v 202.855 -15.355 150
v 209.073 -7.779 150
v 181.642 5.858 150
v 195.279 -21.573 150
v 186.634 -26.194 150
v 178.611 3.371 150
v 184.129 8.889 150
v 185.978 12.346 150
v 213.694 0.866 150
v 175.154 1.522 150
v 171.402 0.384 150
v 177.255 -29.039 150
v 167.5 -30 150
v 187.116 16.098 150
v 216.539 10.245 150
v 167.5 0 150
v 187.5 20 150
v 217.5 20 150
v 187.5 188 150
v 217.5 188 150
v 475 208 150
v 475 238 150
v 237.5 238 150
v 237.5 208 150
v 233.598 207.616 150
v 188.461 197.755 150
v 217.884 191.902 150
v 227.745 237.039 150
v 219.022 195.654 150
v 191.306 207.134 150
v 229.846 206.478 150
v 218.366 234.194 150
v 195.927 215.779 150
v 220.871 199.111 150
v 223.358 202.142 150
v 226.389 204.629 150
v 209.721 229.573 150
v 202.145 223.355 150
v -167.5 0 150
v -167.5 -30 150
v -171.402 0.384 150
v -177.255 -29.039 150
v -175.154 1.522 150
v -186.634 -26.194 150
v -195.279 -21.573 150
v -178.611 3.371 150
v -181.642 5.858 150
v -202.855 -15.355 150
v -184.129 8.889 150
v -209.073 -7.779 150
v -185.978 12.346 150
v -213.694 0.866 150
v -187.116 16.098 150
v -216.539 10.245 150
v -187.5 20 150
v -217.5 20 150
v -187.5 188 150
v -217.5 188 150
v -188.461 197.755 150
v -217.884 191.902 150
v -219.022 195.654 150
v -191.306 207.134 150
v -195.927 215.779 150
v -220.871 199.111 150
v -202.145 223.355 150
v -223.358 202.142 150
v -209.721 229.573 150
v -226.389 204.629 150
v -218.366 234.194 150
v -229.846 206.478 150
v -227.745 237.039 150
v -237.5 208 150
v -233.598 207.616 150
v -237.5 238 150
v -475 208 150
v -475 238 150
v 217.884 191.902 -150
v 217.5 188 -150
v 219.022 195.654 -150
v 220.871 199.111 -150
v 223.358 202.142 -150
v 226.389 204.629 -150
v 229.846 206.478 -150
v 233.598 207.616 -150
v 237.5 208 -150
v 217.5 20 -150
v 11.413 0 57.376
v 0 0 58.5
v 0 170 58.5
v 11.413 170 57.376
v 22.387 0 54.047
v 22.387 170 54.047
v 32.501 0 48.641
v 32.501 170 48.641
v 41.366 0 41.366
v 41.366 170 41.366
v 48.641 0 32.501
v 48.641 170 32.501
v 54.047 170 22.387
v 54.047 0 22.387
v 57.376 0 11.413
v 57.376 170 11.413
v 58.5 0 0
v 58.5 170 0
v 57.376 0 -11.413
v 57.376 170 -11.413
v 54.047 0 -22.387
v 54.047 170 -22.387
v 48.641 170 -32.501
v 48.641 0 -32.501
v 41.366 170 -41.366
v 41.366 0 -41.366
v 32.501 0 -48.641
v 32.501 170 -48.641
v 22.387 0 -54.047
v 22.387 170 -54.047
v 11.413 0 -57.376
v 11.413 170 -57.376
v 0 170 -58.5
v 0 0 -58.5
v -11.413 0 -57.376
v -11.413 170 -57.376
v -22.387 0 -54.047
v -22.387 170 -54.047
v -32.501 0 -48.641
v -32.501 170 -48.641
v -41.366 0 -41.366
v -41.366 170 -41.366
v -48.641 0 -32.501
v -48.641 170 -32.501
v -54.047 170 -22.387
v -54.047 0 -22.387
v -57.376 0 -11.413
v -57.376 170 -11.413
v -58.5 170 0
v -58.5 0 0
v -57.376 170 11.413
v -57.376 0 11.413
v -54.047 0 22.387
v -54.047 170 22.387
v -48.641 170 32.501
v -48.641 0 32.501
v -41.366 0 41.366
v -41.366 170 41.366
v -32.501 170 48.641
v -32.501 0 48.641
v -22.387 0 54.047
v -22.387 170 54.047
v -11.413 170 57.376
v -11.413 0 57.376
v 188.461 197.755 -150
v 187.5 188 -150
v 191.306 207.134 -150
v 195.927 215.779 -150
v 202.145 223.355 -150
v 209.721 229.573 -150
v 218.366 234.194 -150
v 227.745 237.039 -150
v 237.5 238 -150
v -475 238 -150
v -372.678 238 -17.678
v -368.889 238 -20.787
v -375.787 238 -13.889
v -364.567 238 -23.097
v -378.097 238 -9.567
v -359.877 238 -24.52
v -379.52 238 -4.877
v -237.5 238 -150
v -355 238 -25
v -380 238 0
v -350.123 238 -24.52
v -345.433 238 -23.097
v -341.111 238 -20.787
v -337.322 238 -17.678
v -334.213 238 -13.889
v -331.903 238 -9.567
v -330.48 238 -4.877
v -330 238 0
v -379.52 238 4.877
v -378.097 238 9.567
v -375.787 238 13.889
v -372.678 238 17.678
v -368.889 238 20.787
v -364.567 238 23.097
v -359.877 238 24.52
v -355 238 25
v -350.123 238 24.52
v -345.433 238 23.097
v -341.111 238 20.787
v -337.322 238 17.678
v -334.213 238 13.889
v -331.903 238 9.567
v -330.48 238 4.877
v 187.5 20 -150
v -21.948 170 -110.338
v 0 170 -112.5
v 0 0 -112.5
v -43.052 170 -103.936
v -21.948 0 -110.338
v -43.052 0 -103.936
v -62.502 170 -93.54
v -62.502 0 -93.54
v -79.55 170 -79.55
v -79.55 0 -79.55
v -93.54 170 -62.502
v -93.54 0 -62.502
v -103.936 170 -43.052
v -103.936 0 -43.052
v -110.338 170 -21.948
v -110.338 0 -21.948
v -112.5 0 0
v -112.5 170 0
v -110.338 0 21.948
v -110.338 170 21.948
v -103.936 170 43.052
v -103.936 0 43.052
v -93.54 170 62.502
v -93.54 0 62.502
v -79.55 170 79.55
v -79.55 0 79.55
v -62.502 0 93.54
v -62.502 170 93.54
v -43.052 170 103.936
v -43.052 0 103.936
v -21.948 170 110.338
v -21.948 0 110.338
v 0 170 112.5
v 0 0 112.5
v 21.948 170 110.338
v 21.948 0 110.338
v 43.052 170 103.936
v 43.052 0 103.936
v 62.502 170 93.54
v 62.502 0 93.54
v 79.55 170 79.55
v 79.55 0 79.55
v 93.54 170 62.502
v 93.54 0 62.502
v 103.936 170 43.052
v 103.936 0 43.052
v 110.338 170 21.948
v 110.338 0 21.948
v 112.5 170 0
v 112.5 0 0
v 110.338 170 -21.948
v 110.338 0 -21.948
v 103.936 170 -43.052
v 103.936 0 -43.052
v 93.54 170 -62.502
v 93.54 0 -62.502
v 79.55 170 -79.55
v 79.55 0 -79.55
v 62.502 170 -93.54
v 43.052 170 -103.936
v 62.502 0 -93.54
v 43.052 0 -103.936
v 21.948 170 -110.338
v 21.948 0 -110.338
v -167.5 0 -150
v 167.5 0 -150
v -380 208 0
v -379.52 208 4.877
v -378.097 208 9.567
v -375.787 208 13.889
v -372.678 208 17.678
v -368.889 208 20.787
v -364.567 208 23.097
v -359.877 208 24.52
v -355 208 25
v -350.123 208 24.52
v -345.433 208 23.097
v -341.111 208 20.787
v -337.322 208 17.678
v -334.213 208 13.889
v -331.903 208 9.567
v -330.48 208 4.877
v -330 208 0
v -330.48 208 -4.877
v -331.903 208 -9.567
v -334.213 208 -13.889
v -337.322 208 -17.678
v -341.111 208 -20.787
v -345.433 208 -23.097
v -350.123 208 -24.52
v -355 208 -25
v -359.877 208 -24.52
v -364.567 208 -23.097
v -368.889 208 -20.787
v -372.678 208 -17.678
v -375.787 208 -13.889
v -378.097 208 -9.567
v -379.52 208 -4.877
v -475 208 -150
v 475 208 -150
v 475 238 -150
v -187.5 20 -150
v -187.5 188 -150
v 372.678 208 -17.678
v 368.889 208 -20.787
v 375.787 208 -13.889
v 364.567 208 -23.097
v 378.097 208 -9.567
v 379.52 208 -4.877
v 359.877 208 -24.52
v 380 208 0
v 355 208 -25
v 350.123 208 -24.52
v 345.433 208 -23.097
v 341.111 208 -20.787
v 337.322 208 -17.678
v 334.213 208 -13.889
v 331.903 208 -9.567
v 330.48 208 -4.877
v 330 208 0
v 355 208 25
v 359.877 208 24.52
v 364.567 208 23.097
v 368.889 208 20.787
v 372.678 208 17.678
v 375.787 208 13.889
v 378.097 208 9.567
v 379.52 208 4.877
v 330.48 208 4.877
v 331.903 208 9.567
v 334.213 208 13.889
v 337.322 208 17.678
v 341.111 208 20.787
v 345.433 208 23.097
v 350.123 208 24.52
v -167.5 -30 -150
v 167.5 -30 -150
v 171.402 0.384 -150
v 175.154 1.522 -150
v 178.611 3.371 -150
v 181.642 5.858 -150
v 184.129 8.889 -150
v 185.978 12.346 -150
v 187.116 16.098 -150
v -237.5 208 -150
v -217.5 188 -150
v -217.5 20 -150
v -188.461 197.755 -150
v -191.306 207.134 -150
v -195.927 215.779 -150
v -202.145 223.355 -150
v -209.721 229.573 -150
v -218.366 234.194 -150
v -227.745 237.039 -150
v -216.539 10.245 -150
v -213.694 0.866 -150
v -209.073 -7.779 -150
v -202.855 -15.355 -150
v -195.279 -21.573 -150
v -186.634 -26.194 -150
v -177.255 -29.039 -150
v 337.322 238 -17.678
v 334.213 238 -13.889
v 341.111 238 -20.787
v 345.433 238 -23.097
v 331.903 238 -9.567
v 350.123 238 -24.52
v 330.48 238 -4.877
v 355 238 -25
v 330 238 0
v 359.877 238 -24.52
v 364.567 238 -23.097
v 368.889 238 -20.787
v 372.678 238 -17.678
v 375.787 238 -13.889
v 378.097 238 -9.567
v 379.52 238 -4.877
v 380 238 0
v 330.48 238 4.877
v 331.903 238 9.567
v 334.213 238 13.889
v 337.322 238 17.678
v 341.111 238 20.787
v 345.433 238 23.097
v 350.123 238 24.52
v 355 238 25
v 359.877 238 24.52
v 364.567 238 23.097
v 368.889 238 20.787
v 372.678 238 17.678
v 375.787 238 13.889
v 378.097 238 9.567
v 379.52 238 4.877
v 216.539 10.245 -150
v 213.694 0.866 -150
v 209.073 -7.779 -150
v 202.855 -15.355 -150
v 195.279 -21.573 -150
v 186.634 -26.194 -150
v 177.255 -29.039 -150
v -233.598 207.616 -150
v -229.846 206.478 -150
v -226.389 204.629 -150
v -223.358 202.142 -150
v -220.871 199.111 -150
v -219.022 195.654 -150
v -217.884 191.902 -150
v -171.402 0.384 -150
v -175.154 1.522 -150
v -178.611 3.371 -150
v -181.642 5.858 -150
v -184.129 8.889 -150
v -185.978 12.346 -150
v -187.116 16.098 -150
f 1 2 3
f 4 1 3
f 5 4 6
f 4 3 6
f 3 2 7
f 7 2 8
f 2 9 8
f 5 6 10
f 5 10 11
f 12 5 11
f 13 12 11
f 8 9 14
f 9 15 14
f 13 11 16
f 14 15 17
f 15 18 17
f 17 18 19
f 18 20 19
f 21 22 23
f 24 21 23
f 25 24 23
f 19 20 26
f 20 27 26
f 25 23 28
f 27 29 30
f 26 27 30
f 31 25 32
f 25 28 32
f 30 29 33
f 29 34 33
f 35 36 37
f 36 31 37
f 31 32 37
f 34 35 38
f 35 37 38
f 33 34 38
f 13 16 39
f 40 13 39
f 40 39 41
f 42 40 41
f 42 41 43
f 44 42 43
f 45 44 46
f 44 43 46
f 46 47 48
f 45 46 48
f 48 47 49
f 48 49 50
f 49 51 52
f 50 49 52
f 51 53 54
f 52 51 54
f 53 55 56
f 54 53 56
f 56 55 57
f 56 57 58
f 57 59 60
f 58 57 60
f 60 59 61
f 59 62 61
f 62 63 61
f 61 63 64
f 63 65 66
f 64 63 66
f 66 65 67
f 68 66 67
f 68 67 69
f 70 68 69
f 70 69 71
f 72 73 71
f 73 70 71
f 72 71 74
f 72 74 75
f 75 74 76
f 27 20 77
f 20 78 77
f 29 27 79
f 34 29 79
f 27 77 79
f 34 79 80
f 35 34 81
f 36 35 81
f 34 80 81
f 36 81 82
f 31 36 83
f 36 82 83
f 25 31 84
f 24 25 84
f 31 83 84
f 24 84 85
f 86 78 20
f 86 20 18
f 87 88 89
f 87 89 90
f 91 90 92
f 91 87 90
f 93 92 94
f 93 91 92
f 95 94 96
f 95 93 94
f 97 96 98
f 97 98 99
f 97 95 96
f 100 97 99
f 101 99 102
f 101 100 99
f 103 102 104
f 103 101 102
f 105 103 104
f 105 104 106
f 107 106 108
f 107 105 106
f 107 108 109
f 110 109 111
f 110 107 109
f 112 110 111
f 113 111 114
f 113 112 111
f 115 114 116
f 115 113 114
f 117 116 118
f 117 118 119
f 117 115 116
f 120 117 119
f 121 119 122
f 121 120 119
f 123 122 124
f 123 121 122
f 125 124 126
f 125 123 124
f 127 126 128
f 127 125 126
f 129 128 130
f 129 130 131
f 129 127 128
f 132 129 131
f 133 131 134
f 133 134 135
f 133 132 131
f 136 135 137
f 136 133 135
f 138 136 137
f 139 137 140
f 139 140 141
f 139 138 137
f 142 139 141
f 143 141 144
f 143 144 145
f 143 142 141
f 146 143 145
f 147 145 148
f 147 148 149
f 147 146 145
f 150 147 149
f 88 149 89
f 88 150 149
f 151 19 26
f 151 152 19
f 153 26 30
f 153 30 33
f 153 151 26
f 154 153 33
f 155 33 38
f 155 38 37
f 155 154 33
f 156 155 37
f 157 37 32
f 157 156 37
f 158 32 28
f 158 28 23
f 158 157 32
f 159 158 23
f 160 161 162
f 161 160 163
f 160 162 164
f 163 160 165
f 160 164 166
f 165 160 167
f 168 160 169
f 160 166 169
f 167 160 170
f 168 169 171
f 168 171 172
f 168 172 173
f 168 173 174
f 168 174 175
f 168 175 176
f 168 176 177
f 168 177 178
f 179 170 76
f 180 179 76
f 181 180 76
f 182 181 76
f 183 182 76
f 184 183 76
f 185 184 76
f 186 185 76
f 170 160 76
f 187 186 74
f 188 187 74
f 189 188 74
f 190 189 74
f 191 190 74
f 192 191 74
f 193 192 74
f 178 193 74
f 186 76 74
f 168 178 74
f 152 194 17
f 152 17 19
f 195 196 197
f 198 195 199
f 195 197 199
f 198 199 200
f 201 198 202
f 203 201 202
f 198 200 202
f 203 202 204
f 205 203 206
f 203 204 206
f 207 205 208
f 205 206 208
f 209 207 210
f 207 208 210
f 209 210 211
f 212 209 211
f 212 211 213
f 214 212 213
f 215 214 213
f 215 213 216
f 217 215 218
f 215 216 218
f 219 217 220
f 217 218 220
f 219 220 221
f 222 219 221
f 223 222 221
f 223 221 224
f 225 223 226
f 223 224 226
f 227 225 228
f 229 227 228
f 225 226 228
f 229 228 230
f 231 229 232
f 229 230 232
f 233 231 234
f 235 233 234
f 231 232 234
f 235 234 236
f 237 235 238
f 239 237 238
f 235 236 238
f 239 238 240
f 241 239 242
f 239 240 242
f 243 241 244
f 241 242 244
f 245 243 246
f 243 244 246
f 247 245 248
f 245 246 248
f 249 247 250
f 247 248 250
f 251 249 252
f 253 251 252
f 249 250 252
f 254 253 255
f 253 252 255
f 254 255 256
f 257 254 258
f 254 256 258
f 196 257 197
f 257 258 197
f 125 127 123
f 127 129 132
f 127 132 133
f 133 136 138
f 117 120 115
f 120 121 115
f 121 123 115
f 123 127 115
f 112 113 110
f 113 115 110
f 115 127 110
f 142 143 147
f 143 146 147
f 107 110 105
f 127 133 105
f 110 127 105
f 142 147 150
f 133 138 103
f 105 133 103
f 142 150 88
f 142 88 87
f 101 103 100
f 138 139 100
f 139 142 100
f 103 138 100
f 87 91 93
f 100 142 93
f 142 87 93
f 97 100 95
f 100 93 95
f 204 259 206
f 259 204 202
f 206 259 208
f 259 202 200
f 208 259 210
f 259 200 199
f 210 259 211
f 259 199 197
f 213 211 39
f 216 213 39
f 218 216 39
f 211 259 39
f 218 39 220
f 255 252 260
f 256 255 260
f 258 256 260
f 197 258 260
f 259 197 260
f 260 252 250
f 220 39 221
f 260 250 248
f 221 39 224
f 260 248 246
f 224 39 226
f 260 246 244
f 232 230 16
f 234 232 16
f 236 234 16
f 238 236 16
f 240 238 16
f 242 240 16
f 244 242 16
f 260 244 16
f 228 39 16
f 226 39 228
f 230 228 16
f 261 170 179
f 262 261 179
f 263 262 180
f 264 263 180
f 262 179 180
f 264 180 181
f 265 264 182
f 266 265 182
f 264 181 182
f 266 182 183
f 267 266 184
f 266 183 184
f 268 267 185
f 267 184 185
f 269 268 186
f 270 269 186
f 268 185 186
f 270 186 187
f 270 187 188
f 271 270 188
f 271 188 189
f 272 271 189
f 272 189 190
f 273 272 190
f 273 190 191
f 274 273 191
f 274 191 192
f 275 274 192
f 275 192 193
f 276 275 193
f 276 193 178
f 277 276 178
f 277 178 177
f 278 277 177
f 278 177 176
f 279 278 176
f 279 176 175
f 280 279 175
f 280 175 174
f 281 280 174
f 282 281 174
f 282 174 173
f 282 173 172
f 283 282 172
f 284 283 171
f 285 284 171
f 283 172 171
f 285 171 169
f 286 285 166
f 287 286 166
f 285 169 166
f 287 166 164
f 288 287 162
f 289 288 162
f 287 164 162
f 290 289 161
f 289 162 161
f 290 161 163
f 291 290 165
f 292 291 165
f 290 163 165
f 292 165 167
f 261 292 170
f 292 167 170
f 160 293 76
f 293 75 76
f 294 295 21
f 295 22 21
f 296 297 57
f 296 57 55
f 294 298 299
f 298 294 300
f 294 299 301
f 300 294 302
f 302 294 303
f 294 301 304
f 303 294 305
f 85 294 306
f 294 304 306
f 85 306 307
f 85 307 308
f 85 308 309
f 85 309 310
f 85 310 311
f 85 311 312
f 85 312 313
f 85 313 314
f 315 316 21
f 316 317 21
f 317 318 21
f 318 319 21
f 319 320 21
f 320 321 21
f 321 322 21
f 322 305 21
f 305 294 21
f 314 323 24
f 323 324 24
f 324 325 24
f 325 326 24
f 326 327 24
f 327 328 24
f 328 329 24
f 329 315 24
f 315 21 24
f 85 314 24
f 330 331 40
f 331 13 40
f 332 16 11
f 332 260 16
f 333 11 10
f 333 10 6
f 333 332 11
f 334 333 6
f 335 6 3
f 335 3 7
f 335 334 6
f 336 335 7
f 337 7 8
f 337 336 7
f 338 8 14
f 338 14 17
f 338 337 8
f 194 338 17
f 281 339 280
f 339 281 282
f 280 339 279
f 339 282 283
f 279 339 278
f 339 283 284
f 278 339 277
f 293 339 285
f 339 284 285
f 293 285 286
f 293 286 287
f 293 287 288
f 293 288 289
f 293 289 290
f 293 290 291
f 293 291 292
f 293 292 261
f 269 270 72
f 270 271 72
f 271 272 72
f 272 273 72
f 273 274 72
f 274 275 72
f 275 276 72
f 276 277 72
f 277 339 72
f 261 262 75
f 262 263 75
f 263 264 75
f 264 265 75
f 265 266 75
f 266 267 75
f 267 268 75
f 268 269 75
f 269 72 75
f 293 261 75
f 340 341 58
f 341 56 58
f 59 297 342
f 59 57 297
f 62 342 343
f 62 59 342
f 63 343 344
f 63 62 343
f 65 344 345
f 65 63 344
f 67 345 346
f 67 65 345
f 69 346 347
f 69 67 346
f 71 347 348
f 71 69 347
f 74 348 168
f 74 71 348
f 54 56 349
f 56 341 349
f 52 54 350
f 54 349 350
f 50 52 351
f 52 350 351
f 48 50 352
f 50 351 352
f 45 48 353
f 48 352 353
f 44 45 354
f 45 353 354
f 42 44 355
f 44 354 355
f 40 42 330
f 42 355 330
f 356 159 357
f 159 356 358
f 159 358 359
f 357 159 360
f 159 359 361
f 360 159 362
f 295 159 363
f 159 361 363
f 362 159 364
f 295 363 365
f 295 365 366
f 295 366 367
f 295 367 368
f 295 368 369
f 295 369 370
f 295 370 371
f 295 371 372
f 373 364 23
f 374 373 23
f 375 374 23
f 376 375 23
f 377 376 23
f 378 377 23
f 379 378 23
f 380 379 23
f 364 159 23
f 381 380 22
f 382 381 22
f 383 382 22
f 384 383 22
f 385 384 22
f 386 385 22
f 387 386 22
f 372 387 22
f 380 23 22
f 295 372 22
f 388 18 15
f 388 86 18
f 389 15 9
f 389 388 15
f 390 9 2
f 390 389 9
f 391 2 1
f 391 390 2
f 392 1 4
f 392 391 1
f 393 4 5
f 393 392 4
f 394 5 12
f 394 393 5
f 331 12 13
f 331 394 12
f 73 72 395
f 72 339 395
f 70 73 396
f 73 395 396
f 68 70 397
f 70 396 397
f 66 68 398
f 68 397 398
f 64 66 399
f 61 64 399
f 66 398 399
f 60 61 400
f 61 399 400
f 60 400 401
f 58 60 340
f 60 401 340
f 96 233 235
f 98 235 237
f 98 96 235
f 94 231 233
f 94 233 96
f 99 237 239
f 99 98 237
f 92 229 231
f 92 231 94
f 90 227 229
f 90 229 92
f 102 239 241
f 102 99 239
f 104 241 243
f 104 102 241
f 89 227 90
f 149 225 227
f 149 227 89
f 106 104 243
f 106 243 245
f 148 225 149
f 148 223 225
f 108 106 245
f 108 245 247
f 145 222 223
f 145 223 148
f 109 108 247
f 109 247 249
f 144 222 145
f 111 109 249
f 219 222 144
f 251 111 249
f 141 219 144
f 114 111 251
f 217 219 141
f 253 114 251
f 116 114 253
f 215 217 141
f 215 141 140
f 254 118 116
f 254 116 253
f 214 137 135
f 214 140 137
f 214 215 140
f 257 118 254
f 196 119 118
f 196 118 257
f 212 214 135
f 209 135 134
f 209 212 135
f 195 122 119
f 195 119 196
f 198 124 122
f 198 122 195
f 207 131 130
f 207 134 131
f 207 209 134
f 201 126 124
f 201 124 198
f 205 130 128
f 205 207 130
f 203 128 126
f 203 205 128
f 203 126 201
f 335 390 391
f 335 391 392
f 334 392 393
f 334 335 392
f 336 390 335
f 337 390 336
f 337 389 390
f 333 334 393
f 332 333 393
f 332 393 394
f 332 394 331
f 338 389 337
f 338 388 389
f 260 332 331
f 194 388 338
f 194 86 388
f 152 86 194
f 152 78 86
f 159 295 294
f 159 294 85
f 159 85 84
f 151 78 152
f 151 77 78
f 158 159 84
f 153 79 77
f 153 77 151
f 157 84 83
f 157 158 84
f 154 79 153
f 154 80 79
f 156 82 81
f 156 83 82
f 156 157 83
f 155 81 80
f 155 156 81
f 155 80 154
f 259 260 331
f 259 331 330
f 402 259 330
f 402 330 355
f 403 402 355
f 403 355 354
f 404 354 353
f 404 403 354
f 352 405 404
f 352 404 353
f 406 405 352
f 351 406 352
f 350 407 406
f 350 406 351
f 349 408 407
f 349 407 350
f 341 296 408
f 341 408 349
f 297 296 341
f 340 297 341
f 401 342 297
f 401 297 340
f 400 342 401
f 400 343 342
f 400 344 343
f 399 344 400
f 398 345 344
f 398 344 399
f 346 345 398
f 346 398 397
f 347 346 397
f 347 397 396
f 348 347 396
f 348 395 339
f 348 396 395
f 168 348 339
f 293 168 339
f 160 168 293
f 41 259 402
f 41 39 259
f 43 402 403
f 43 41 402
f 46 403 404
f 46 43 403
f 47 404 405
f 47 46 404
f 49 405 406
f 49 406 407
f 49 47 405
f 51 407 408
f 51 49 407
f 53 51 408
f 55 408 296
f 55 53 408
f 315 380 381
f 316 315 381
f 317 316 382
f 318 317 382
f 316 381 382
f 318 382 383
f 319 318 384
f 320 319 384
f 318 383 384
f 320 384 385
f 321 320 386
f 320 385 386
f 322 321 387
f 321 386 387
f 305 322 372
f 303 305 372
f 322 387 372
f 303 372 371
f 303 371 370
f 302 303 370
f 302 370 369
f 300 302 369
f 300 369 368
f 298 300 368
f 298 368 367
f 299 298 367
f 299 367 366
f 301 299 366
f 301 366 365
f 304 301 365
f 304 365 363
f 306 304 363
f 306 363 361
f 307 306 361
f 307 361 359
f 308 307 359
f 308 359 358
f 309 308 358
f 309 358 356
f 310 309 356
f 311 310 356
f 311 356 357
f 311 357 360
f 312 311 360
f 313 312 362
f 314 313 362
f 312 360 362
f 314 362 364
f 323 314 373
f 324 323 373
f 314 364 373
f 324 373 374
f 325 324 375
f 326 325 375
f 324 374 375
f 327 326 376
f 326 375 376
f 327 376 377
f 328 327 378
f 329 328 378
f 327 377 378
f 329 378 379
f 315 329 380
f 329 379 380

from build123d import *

# Parameters (mm, degrees)
BOSS_EXTRUDE1_DEPTH = 150
FILLET1_R           = 20
FILLET2_R           = 50
SKETCH2_R           = 25
CUT_EXTRUDE1_DEPTH  = 566.640345096
SKETCH3_R           = 112.5
SKETCH3_R_2         = 58.5
BOSS_EXTRUDE2_DEPTH = 170


with BuildPart() as part:
    # Sketch1 → Boss-Extrude1 (new, symmetric)
    with BuildSketch(Plane.XY):
        Polygon((-187.5, 0), (187.5, 0), (187.5, 238), (475, 238), (475, 208), (217.5, 208), (217.5, -30), (-217.5, -30), (-217.5, 208), (-475, 208), (-475, 238), (-187.5, 238), align=None)
    extrude(amount=BOSS_EXTRUDE1_DEPTH, both=True)

    # Fillet1
    fillet1_edges = [part.edges().sort_by_distance(p)[0] for p in [
        (-187.5, 0, 0),
        (187.5, 0, 0),
        (217.5, 208, 0),
        (-217.5, 208, 0),
    ]]
    fillet(fillet1_edges, radius=FILLET1_R)

    # Fillet2
    fillet2_edges = [part.edges().sort_by_distance(p)[0] for p in [
        (187.5, 238, 0),
        (217.5, -30, 0),
        (-217.5, -30, 0),
        (-187.5, 238, 0),
    ]]
    fillet(fillet2_edges, radius=FILLET2_R)

    # Sketch2 → Cut-Extrude1 (cut, through all)
    with BuildSketch(Plane(origin=(0, 238, 0), x_dir=(1, 0, 0), z_dir=(0, 1, 0))):
        with Locations(Location((-355, 0, 0), (0, 0, 180))):
            Circle(SKETCH2_R)
        with Locations(Location((355, 0, 0), (0, 0, 270))):
            Circle(SKETCH2_R)
    extrude(amount=-CUT_EXTRUDE1_DEPTH, mode=Mode.SUBTRACT)

    # Sketch3 → Boss-Extrude2 (add)
    with BuildSketch(Plane(origin=(0, 0, 0), x_dir=(1, 0, 0), z_dir=(0, 1, 0))):
        with Locations(Location((0, 0, 0), (0, 0, 90))):
            Circle(SKETCH3_R)
        with Locations(Location((0, 0, 0), (0, 0, 270))):
            Circle(SKETCH3_R_2, mode=Mode.SUBTRACT)
    extrude(amount=BOSS_EXTRUDE2_DEPTH)


solid = part.part
